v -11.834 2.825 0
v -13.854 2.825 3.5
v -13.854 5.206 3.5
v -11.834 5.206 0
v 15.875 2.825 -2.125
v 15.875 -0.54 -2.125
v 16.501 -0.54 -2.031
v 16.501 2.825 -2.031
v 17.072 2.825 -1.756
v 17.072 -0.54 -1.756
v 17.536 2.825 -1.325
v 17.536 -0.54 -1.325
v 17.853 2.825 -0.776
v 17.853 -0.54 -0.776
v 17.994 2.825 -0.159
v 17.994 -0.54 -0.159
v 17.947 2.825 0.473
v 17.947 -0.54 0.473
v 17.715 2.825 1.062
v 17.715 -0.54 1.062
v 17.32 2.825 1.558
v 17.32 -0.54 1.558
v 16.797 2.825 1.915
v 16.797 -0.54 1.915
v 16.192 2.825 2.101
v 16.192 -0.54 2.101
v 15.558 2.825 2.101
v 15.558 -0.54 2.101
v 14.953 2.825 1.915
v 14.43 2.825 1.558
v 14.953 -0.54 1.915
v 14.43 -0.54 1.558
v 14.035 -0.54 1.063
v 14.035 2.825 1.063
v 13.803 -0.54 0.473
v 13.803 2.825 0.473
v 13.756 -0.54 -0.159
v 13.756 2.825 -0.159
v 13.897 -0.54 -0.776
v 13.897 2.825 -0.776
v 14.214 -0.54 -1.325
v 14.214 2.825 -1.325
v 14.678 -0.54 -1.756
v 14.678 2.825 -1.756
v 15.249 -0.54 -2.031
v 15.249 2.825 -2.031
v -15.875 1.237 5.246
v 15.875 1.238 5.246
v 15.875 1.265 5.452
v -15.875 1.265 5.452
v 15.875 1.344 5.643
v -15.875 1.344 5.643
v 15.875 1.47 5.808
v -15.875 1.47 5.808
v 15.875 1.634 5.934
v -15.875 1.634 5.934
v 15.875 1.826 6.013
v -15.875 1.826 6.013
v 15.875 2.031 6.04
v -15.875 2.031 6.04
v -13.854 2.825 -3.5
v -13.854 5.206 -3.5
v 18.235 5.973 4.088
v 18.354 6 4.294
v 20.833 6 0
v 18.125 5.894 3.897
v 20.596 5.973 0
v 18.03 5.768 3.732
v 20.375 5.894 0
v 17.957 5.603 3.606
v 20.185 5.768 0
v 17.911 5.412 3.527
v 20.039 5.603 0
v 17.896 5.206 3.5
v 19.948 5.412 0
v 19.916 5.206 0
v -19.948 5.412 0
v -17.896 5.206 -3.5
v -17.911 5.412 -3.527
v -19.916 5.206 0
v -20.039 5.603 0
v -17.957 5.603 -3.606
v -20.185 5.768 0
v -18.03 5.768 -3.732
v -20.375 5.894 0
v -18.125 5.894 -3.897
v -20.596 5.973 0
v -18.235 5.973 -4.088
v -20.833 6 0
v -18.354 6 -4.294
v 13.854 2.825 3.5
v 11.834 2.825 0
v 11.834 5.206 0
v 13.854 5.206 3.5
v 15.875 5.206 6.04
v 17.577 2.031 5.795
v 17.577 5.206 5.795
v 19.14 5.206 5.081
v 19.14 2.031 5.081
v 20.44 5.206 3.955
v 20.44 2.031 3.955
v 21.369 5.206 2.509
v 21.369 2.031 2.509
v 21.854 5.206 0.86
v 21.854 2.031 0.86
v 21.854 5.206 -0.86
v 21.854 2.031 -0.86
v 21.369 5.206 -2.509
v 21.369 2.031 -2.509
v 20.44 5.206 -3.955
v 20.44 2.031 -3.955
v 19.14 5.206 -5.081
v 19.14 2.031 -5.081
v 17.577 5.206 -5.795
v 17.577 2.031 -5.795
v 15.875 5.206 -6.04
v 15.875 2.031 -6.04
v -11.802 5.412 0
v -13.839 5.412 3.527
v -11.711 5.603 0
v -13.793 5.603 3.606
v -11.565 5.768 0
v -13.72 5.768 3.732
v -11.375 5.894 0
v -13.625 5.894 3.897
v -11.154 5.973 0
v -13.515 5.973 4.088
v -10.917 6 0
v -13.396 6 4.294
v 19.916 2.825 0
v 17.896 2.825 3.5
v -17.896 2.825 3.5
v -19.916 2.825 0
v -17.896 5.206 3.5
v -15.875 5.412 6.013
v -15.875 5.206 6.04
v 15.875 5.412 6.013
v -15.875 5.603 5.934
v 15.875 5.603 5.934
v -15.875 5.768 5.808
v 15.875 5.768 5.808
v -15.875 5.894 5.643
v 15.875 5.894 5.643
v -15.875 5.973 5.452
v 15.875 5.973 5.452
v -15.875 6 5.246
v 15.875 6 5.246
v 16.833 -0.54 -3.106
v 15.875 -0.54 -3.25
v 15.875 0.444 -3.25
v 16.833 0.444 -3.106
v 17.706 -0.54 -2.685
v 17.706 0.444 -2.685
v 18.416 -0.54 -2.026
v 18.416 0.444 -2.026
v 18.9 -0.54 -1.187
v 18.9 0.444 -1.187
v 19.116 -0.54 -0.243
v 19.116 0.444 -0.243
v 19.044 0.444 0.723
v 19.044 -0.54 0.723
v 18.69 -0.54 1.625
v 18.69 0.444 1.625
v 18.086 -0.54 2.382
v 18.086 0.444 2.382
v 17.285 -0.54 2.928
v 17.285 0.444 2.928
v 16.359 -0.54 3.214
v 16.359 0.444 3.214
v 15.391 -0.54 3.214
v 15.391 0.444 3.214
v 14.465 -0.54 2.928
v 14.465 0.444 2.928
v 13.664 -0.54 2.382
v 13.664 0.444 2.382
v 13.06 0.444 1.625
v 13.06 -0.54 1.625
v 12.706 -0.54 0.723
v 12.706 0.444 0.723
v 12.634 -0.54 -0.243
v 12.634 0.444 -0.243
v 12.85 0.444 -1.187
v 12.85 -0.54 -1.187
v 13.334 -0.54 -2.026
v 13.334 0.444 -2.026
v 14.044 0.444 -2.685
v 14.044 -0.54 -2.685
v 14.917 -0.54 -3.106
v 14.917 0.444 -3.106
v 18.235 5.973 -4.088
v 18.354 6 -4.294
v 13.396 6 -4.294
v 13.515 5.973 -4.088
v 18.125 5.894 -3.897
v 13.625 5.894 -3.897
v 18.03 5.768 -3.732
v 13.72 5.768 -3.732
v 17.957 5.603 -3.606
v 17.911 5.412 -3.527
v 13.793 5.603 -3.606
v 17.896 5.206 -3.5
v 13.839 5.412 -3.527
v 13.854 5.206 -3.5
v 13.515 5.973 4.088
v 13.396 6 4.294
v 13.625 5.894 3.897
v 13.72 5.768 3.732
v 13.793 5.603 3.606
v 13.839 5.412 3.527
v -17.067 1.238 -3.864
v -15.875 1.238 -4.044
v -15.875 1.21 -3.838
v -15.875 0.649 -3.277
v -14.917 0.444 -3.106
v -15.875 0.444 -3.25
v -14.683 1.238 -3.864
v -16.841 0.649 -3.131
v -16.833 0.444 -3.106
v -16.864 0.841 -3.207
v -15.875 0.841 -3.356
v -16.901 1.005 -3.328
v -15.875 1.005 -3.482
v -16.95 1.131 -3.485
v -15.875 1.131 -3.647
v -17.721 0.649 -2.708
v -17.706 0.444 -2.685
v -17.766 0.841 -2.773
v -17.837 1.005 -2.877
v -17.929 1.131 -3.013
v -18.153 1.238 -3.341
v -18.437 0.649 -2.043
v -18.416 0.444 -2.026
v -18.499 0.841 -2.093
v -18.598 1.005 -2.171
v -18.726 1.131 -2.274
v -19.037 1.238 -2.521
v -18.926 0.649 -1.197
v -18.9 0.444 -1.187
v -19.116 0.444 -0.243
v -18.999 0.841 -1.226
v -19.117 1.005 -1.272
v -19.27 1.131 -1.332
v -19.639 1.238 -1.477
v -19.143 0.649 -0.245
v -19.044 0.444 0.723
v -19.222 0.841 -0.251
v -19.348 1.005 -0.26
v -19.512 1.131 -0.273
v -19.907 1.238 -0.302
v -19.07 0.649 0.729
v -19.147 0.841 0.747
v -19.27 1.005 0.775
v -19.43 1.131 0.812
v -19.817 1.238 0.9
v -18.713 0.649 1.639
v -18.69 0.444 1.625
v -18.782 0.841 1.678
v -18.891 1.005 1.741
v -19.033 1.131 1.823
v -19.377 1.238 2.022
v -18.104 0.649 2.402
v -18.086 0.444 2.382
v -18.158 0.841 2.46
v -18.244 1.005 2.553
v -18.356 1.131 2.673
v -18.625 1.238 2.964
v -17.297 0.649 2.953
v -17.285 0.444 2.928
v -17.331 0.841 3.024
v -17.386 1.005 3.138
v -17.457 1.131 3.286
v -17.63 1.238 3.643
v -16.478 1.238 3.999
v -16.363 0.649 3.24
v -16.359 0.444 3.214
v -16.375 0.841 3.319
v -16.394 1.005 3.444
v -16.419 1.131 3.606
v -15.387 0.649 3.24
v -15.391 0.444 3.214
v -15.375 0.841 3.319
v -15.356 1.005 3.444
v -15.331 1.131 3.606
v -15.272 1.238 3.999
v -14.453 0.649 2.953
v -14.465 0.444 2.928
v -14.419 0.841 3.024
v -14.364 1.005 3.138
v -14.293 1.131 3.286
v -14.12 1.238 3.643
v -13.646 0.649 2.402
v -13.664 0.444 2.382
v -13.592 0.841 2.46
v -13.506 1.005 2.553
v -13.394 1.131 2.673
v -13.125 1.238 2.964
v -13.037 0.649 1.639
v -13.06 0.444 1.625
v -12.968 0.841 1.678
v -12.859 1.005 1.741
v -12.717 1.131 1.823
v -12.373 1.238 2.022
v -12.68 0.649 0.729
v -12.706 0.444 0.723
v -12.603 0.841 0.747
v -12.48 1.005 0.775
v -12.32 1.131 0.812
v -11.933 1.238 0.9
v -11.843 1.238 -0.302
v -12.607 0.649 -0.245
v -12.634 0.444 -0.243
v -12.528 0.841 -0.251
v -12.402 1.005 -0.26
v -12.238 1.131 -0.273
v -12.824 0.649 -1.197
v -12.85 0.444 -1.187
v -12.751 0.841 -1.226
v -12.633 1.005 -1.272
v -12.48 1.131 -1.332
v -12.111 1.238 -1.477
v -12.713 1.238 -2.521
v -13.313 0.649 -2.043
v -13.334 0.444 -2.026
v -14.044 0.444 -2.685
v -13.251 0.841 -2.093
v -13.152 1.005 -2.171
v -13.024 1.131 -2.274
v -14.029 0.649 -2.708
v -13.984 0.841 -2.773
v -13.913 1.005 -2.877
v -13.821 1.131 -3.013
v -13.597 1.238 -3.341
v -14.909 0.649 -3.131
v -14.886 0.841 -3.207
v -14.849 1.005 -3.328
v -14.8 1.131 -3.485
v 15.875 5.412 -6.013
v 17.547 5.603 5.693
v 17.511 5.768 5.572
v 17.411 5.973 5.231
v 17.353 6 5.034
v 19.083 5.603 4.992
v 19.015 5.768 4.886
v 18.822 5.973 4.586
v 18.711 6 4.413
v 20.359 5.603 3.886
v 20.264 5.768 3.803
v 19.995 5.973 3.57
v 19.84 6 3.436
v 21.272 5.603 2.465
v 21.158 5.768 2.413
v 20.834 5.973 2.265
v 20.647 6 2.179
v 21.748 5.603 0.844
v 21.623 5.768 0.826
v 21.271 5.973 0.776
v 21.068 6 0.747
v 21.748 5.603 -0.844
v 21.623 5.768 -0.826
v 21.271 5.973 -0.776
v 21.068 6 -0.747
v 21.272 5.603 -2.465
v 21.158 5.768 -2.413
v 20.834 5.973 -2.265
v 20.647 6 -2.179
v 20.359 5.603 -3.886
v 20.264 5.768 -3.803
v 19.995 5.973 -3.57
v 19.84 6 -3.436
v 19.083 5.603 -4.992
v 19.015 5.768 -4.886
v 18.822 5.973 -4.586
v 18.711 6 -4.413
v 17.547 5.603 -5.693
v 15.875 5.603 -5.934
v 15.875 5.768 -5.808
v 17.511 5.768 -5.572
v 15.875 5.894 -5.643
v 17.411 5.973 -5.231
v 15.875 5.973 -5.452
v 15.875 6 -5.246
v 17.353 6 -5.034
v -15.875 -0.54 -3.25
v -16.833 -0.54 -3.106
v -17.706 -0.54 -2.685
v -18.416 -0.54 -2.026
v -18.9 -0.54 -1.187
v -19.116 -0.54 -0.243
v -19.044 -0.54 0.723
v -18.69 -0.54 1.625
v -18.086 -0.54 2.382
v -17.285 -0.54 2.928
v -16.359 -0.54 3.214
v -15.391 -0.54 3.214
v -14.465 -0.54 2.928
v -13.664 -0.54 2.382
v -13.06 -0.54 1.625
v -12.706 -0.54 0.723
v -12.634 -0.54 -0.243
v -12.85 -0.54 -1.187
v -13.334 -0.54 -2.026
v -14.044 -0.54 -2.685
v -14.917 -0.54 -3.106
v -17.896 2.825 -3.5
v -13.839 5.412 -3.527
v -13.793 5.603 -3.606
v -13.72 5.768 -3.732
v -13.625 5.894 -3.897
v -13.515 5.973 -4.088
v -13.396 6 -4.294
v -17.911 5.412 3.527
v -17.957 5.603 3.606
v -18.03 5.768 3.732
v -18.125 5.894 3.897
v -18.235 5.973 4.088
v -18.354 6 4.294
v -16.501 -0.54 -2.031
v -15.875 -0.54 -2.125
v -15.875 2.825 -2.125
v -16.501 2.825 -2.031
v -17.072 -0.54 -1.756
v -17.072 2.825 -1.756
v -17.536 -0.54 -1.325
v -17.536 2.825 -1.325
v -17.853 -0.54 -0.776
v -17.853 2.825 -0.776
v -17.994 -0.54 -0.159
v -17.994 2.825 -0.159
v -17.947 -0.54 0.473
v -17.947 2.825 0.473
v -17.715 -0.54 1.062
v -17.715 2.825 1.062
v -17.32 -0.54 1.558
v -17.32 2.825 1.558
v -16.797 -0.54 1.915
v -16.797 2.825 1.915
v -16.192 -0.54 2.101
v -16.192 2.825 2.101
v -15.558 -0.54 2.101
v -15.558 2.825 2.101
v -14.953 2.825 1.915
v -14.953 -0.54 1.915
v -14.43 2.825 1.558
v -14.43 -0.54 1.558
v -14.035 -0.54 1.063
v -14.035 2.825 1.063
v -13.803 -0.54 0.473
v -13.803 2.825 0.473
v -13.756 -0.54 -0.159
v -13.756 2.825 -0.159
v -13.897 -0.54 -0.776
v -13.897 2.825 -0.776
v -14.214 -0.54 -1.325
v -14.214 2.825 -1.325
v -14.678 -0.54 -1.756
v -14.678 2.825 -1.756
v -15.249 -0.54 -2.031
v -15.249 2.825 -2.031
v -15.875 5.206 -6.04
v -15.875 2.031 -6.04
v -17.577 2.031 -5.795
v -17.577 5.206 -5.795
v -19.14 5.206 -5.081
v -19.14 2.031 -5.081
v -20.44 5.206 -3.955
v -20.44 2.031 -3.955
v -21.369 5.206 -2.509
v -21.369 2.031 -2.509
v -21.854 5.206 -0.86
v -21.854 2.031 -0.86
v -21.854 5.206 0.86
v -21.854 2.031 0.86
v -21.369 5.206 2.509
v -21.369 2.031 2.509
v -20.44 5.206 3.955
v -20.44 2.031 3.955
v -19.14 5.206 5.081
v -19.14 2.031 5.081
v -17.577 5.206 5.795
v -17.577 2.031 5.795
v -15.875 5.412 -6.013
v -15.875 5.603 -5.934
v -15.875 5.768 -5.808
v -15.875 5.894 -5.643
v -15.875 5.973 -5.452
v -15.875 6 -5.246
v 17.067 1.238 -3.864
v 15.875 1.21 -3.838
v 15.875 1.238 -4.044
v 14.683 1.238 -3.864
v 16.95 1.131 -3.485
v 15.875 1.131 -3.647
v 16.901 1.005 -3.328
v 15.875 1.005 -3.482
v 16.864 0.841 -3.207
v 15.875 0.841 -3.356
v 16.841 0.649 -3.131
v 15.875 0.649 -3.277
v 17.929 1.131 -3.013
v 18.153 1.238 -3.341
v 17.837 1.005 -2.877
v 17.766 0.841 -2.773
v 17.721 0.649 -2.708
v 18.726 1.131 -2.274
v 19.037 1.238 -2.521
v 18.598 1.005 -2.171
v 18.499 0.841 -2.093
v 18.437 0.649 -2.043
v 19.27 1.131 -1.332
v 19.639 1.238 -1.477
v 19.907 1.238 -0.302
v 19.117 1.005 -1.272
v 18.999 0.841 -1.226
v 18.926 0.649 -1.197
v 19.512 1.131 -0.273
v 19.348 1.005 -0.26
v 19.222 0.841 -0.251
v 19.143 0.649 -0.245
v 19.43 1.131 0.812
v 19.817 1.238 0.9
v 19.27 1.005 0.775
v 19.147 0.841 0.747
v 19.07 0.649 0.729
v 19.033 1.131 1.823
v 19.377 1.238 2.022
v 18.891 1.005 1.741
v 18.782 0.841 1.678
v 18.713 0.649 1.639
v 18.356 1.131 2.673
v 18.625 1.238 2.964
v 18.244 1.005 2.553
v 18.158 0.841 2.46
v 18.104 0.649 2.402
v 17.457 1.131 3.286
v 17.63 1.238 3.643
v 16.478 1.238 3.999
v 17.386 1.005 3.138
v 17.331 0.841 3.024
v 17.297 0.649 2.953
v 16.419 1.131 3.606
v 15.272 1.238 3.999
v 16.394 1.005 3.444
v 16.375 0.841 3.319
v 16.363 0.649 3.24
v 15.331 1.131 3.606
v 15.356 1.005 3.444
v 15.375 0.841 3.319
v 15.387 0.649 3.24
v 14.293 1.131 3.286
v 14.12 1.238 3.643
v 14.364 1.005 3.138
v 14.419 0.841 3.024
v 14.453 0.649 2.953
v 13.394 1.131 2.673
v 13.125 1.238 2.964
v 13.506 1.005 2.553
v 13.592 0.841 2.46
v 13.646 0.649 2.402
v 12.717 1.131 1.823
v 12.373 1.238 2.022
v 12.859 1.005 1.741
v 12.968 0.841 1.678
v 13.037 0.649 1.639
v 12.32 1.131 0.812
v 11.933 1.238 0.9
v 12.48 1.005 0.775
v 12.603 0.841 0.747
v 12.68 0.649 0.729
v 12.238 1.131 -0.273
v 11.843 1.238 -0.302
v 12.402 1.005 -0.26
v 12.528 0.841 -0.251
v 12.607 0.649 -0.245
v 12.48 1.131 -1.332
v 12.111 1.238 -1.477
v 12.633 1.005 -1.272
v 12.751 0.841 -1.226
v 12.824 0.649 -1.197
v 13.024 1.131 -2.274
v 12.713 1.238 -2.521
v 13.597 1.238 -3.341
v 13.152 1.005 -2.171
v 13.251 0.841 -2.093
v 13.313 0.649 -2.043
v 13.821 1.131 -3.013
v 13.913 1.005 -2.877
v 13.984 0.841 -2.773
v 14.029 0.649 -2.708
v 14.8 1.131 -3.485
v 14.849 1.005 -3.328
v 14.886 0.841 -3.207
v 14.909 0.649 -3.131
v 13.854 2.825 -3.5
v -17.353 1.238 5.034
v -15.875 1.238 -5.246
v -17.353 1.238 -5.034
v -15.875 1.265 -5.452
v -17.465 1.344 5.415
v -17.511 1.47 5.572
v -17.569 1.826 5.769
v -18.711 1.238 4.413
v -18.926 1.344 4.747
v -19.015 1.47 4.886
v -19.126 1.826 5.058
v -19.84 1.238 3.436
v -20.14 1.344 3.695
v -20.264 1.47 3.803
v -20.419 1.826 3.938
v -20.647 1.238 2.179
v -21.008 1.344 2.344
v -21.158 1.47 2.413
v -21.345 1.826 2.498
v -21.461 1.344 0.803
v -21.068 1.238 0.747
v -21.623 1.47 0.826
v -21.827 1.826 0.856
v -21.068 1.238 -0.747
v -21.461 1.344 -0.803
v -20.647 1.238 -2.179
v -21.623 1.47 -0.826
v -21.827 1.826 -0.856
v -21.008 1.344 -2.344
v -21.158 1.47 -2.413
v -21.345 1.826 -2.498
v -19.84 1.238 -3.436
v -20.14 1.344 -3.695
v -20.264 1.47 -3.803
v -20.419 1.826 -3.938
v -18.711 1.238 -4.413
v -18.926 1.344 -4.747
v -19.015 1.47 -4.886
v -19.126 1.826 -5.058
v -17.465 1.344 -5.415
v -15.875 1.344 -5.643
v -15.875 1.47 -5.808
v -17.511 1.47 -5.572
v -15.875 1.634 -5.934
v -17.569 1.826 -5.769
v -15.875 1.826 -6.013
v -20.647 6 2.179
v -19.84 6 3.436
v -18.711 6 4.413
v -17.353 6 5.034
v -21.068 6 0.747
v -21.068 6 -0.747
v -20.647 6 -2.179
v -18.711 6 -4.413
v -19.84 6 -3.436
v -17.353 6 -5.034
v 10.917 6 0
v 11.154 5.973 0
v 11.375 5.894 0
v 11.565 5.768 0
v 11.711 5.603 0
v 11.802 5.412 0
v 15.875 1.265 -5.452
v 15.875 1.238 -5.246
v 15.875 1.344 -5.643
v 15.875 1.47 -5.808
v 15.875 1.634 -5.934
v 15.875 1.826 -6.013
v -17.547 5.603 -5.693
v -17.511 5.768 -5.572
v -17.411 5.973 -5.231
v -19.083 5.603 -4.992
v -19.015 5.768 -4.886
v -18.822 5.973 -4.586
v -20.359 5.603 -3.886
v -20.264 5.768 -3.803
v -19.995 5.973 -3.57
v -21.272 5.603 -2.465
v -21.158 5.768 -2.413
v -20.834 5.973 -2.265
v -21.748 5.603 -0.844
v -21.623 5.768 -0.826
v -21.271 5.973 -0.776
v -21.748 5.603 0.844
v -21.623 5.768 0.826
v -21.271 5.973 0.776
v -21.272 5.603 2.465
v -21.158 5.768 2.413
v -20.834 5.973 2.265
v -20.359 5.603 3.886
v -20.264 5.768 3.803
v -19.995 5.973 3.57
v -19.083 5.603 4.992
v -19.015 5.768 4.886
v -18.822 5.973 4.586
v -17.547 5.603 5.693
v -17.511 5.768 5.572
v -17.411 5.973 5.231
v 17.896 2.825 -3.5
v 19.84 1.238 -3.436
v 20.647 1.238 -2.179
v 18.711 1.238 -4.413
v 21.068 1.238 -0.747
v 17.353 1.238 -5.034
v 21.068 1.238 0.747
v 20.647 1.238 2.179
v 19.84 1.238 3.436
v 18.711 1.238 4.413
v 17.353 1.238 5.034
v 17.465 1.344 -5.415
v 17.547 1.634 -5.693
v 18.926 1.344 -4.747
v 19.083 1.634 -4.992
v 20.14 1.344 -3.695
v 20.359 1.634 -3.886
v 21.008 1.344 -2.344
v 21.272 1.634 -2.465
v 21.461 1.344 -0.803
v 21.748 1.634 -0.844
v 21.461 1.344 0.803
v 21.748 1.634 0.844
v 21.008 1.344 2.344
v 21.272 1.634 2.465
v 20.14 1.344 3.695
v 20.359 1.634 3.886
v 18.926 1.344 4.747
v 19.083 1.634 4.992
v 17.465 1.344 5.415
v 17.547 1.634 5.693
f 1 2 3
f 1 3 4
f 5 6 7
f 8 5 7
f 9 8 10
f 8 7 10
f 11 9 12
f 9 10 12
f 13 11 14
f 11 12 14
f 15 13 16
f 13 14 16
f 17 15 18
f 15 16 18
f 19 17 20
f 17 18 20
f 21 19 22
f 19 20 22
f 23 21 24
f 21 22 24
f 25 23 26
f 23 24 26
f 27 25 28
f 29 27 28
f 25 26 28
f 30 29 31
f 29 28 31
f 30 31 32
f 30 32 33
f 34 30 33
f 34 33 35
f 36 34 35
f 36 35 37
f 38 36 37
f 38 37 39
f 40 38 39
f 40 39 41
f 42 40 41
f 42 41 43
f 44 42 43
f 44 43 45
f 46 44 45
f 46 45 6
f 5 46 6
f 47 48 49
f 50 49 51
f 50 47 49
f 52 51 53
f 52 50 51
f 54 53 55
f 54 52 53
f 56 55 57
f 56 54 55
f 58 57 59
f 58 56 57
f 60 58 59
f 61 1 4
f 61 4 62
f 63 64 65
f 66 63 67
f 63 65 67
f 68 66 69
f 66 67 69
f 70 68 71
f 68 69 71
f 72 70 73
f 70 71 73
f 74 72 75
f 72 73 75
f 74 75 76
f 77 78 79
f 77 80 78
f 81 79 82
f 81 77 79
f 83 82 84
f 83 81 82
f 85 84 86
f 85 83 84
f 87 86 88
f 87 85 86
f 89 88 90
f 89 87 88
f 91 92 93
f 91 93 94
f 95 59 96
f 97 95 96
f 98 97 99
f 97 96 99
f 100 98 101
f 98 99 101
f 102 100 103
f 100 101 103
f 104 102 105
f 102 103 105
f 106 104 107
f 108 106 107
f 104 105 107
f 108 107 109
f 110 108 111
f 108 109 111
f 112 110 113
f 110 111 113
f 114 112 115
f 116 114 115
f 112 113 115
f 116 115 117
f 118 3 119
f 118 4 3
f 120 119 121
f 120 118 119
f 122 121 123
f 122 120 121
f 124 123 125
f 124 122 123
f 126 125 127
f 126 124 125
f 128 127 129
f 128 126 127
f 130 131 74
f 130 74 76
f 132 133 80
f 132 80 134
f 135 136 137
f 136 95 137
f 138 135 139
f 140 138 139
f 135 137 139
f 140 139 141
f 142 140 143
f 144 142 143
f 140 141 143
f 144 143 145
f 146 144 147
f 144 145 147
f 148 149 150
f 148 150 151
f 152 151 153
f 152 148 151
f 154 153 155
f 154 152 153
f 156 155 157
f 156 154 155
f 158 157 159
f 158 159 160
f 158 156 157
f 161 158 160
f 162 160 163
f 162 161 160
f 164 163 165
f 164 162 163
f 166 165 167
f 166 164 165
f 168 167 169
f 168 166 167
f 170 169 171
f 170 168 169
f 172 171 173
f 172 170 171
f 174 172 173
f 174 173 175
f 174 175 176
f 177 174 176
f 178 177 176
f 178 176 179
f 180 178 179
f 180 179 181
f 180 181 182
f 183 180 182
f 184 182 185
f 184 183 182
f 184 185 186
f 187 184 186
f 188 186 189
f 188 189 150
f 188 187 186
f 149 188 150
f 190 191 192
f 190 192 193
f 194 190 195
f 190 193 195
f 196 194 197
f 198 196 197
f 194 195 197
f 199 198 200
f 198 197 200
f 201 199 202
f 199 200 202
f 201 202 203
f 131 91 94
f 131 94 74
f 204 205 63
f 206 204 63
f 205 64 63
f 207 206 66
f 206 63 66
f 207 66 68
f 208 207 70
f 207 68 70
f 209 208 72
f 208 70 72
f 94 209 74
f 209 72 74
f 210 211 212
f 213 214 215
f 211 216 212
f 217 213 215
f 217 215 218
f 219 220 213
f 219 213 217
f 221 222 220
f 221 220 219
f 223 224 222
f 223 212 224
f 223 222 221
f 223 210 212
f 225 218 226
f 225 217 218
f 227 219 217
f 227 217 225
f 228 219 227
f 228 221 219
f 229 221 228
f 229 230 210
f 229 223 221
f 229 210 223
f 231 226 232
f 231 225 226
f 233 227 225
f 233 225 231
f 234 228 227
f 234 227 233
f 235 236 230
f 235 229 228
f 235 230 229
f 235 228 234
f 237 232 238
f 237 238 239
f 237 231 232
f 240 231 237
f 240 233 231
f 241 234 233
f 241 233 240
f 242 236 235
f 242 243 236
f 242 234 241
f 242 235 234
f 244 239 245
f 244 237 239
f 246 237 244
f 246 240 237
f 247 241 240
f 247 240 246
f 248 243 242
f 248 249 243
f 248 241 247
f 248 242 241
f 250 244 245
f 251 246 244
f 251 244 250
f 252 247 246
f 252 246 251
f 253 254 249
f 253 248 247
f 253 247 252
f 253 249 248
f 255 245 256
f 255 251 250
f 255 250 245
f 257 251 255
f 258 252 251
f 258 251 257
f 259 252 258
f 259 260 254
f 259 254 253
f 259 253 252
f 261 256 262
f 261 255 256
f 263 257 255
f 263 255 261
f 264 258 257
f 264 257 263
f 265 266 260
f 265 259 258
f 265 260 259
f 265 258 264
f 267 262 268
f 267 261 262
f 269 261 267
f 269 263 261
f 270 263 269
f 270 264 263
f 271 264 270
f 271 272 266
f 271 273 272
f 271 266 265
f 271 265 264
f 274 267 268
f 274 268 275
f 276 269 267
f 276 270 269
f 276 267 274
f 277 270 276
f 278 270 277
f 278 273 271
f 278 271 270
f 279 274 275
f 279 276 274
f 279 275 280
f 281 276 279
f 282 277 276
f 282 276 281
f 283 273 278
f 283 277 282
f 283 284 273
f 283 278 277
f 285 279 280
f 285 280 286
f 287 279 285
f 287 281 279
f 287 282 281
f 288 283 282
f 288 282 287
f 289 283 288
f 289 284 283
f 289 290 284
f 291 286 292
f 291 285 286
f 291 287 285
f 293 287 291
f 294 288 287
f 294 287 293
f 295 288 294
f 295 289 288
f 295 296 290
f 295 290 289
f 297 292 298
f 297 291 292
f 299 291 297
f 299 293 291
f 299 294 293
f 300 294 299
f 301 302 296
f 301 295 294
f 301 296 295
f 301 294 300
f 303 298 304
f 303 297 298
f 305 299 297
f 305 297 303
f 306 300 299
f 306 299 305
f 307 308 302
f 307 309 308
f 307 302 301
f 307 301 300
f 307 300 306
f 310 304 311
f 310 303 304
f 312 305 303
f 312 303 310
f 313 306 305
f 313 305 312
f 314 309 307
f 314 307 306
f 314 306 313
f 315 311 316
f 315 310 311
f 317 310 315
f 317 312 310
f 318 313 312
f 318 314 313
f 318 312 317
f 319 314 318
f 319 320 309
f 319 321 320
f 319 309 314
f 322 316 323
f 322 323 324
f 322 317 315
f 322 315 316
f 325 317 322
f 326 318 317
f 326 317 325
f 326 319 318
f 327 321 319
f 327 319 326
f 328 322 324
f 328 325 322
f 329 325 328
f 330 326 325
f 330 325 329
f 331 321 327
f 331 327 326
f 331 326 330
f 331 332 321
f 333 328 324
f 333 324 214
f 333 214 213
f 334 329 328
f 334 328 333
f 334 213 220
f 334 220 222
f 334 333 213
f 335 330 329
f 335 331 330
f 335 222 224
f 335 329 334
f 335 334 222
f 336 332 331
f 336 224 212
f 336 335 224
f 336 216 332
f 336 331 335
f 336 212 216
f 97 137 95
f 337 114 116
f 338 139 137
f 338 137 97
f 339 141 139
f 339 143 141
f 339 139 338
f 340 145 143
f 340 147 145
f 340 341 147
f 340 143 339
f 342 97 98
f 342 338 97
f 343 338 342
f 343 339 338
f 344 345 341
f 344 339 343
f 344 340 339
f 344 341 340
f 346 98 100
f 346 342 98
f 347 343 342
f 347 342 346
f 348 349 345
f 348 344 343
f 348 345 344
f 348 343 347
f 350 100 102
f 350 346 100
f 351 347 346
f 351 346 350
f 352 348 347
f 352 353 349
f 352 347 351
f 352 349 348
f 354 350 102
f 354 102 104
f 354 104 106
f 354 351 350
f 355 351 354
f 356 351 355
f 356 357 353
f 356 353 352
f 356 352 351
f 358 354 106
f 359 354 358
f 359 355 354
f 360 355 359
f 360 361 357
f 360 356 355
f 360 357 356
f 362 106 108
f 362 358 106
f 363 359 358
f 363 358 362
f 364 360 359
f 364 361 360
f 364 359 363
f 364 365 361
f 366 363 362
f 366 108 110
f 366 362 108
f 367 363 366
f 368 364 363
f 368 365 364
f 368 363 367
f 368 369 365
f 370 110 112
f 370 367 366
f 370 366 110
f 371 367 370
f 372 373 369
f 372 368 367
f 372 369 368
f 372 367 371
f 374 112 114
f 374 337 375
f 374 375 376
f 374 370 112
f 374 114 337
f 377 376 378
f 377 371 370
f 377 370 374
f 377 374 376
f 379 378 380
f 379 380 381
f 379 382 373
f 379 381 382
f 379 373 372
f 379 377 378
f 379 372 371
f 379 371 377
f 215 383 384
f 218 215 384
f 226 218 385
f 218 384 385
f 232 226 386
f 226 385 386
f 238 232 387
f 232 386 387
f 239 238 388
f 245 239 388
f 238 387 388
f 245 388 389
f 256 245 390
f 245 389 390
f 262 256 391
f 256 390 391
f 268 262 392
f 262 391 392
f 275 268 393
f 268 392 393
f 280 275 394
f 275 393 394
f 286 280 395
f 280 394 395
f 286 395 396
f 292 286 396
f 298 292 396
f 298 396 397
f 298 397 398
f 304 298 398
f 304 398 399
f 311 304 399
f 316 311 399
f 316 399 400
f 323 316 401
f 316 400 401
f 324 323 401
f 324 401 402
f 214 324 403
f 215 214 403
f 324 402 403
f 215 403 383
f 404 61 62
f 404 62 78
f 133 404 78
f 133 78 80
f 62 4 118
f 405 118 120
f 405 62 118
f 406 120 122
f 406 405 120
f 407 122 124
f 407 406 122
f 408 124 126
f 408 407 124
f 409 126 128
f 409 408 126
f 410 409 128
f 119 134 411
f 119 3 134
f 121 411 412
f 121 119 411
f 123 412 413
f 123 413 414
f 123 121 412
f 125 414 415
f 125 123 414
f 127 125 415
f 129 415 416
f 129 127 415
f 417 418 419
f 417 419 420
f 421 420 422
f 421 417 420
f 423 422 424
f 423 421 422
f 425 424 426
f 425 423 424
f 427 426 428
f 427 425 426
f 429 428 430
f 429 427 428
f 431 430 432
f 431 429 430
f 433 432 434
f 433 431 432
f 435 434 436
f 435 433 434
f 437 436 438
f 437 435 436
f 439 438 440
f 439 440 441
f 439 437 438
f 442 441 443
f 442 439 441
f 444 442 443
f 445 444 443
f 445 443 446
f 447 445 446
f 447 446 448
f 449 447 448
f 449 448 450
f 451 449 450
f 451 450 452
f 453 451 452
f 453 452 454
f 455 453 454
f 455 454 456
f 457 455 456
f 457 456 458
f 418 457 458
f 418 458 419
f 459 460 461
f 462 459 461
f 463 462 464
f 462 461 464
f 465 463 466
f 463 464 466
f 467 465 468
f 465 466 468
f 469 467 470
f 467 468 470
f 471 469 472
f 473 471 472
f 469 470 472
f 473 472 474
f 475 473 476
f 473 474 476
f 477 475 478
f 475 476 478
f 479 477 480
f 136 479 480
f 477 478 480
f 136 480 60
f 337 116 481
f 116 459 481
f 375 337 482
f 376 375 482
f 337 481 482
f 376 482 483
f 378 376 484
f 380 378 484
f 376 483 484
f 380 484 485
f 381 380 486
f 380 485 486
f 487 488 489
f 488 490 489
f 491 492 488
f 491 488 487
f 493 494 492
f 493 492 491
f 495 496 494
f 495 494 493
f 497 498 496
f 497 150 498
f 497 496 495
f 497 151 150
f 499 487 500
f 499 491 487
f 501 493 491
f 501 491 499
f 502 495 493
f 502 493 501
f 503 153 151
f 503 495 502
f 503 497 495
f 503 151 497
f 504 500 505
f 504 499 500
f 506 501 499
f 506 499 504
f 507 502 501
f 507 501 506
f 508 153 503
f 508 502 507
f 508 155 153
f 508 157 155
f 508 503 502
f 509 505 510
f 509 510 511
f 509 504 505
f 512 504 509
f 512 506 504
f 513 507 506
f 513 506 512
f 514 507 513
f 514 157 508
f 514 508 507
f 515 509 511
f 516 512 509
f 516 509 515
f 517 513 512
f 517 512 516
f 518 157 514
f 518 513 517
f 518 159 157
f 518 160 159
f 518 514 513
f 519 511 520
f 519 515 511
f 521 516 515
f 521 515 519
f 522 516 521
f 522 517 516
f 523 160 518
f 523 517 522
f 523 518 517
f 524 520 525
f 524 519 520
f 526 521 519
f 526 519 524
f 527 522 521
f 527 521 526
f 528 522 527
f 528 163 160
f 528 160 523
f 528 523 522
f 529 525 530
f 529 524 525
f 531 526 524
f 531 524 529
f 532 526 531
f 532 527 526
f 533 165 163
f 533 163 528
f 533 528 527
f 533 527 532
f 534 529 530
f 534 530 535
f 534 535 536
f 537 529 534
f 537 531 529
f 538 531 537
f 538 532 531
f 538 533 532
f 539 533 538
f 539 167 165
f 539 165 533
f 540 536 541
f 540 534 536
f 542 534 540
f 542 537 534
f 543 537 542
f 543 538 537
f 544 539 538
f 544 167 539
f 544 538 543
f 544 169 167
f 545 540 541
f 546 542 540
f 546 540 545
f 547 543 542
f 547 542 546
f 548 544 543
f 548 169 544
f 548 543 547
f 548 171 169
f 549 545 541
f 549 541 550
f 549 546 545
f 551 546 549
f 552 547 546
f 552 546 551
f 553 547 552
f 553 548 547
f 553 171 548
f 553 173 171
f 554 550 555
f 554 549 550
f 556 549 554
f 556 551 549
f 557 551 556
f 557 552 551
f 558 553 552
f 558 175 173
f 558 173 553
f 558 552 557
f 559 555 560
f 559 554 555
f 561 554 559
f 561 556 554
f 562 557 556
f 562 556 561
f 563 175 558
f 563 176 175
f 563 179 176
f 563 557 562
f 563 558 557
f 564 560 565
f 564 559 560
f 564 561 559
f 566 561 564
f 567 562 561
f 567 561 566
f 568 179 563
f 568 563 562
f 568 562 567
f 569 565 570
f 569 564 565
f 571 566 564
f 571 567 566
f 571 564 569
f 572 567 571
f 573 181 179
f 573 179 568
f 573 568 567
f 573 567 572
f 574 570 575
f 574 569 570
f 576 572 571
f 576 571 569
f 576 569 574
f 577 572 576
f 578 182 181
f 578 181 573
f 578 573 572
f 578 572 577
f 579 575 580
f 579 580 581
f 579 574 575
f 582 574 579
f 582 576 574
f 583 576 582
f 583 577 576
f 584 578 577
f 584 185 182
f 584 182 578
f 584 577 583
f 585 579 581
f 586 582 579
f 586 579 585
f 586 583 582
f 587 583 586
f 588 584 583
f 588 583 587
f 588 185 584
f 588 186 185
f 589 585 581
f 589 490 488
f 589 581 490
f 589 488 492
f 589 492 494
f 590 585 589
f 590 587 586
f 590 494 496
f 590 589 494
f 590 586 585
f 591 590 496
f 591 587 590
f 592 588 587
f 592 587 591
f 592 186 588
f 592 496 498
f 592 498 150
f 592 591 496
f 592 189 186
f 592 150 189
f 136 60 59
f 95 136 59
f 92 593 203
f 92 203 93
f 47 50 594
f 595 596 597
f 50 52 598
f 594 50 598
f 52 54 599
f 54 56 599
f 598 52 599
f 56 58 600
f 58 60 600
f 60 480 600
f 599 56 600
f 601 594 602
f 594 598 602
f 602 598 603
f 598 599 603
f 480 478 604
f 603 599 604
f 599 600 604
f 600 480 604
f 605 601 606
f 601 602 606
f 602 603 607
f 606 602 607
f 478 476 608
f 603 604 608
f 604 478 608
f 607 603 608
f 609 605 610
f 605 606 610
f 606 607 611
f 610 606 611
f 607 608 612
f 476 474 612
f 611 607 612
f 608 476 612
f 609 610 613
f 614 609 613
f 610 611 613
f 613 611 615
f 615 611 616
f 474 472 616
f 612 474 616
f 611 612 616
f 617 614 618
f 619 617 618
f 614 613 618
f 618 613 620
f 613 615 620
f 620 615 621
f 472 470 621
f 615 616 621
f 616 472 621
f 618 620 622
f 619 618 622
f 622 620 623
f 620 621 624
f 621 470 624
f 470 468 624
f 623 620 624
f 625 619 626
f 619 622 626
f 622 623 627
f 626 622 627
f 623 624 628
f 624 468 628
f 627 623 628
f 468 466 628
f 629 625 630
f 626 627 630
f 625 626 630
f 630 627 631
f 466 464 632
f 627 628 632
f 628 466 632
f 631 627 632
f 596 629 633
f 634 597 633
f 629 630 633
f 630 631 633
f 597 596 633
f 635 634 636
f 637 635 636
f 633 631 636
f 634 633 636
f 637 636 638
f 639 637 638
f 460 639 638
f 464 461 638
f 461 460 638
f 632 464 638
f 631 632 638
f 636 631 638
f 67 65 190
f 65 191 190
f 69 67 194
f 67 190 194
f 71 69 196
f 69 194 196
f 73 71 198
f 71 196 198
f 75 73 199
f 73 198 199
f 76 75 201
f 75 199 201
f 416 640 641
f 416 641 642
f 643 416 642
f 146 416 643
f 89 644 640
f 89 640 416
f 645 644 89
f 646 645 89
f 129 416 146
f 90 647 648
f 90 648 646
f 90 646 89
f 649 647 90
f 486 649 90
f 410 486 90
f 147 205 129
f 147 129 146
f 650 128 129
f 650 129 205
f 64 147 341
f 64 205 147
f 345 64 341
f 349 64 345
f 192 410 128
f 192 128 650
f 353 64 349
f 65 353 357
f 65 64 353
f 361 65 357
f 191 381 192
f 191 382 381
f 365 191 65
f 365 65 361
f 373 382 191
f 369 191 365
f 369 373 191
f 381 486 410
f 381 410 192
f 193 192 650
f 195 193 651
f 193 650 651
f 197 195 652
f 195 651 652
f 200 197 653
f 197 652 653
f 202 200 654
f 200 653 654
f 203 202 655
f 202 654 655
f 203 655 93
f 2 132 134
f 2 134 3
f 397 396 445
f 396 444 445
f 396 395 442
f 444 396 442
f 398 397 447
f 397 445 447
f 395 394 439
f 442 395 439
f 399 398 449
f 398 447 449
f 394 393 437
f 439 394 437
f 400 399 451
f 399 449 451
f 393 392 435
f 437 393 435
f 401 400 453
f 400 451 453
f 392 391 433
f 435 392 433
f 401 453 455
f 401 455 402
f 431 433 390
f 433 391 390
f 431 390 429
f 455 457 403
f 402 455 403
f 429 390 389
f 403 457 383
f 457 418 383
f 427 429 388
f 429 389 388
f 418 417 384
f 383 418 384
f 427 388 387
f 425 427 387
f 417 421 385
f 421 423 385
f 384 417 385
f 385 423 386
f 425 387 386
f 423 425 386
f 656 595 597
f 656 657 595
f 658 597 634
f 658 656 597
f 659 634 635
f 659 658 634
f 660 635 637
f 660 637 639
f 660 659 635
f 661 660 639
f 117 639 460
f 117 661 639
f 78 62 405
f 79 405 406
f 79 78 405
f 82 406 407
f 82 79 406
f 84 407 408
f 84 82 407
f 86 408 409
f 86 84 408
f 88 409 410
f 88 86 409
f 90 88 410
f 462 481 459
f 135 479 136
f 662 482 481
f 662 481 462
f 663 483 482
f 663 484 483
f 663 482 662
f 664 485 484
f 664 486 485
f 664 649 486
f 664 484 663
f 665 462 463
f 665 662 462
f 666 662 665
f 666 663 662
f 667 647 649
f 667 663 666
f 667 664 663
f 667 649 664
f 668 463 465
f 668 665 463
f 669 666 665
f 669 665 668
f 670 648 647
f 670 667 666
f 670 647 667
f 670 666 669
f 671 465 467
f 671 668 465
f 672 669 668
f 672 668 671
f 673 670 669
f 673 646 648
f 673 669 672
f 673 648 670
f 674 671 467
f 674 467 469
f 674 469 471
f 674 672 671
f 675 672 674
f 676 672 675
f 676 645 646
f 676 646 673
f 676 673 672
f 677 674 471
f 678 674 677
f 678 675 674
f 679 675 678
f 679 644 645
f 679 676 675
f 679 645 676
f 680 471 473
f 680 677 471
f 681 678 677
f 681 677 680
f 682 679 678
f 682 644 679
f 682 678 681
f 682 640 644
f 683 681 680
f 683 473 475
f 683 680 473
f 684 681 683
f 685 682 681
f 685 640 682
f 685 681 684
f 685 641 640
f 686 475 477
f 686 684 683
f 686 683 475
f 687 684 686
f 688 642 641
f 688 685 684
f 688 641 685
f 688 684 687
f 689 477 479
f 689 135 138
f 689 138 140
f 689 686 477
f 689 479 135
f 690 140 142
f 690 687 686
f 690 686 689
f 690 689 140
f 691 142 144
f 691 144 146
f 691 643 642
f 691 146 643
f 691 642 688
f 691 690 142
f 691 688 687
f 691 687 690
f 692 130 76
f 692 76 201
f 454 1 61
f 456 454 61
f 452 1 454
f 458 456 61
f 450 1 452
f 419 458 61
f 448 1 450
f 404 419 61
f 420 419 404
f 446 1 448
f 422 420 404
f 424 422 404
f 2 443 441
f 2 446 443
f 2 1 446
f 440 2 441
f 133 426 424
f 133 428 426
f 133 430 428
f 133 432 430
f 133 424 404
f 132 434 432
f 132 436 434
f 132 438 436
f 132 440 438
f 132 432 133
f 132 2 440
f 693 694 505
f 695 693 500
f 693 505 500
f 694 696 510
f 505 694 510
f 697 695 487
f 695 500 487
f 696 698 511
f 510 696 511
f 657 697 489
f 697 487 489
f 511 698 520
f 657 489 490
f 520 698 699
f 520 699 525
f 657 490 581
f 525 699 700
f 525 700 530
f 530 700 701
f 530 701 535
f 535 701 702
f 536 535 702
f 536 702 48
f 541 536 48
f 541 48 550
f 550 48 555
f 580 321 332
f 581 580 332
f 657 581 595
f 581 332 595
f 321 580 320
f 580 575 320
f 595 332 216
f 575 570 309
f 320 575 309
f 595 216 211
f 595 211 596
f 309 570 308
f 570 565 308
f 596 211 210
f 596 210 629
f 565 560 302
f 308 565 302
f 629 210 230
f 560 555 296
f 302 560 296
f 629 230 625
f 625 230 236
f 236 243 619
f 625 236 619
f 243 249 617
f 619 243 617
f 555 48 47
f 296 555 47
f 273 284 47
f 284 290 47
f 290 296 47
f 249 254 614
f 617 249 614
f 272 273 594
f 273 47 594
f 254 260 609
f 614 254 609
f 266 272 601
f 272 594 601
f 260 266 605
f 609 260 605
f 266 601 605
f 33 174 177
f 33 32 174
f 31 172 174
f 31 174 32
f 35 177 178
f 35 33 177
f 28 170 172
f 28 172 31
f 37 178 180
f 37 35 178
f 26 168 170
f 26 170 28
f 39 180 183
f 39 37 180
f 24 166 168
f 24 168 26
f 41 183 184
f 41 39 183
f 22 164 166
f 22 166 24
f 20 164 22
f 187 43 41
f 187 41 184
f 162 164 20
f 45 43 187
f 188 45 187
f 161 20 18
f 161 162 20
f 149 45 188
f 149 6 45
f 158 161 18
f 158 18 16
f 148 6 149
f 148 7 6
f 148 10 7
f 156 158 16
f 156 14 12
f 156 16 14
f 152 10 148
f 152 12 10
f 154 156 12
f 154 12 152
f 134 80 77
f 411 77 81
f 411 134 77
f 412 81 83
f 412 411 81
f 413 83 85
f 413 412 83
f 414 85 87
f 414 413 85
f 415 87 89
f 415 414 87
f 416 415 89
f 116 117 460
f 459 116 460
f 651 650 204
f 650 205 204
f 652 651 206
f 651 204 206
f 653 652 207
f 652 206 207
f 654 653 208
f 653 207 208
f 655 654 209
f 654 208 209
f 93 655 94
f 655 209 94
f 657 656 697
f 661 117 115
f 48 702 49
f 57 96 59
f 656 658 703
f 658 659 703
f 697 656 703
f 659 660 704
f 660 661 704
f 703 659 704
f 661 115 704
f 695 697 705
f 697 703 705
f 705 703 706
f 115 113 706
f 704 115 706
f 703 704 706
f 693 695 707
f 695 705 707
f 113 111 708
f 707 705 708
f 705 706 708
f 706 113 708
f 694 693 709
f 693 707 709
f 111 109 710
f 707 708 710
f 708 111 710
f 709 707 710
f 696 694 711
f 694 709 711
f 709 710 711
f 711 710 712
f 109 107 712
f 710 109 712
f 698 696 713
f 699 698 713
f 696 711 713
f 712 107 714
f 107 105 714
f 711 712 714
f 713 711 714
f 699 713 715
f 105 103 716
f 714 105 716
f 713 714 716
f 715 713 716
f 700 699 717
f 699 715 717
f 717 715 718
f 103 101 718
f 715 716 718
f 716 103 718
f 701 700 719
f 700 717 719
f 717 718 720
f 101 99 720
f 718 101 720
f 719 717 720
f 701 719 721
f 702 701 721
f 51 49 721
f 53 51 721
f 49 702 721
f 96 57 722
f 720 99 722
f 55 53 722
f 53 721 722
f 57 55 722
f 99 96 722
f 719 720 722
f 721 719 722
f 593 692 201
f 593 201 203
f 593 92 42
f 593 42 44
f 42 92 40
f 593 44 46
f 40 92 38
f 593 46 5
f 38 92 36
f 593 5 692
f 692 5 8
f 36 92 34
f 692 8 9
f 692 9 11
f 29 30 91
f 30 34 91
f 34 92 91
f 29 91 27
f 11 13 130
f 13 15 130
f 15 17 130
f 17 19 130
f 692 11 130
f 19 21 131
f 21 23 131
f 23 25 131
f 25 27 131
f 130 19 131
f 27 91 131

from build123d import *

# Parameters (mm, degrees)
BOSS_EXTRUDE1_DEPTH = 4.5
BOSS_EXTRUDE2_DEPTH = 1.5
CUT_EXTRUDE1_DEPTH  = 1.2375
SKETCH6_R           = 2.125
BOSS_EXTRUDE3_DEPTH = 1.5875
BOSS_EXTRUDE4_START = 1.778
SKETCH7_R           = 3.25
SKETCH7_R_2         = 2.125
BOSS_EXTRUDE4_DEPTH = 1.778
FILLET2_R           = 0.79375
FILLET3_R           = 0.79375


with BuildPart() as part:
    # Sketch1 → Boss-Extrude1 (new body)
    with BuildSketch(Plane(origin=(0, 0, 0), x_dir=(1, 0, 0), z_dir=(0, 1, 0))):
        with BuildLine():
            Line((-15.875, 6.04), (15.875, 6.04))
            ThreePointArc((15.875, 6.04), (21.915, 0), (15.875, -6.04))
            Line((15.875, -6.04), (-15.875, -6.04))
            ThreePointArc((-15.875, -6.04), (-21.915, 0), (-15.875, 6.04))
        make_face()
        Polygon((-13.854274058, 3.5), (-17.895725942, 3.5), (-19.916451884, 0), (-17.895725942, -3.5), (-13.854274058, -3.5), (-11.833548116, 0), align=None, mode=Mode.SUBTRACT)
        Polygon((17.895725942, 3.5), (13.854274058, 3.5), (11.833548116, 0), (13.854274058, -3.5), (17.895725942, -3.5), (19.916451884, 0), align=None, mode=Mode.SUBTRACT)
    extrude(amount=BOSS_EXTRUDE1_DEPTH)

    # Sketch2 → Boss-Extrude2 (add)
    with BuildSketch(Plane(origin=(0, 4.5, 0), x_dir=(1, 0, 0), z_dir=(0, 1, 0))):
        with BuildLine():
            Line((15.875, 6.04), (-15.875, 6.04))
            ThreePointArc((-15.875, 6.04), (-21.915, 0), (-15.875, -6.04))
            Line((-15.875, -6.04), (15.875, -6.04))
            ThreePointArc((15.875, -6.04), (21.915, 0), (15.875, 6.04))
        make_face()
        Polygon((19.916451884, 0), (17.895725942, 3.5), (13.854274058, 3.5), (11.833548116, 0), (13.854274058, -3.5), (17.895725942, -3.5), align=None, mode=Mode.SUBTRACT)
        Polygon((-17.895725942, 3.5), (-19.916451884, 0), (-17.895725942, -3.5), (-13.854274058, -3.5), (-11.833548116, 0), (-13.854274058, 3.5), align=None, mode=Mode.SUBTRACT)
    extrude(amount=BOSS_EXTRUDE2_DEPTH)

    # Sketch3 → Cut-Extrude1 (cut)
    with BuildSketch(Plane.XZ):
        with BuildLine():
            Line((15.875, 6.04), (-15.875, 6.04))
            ThreePointArc((-15.875, 6.04), (-21.915, 0), (-15.875, -6.04))
            Line((-15.875, -6.04), (15.875, -6.04))
            ThreePointArc((15.875, -6.04), (21.915, 0), (15.875, 6.04))
        make_face()
    extrude(amount=-CUT_EXTRUDE1_DEPTH, mode=Mode.SUBTRACT)

    # Sketch6 → Boss-Extrude3 (add)
    with BuildSketch(Plane.XZ.offset(-1.2375)):
        Polygon((13.854274058, 3.5), (11.833548116, 0), (13.854274058, -3.5), (17.895725942, -3.5), (19.916451884, 0), (17.895725942, 3.5), align=None)
        with Locations(Location((15.875, 0, 0), (0, 0, 270))):
            Circle(SKETCH6_R, mode=Mode.SUBTRACT)
    boss_extrude3 = extrude(amount=-BOSS_EXTRUDE3_DEPTH)

    # Sketch7 → Boss-Extrude4 (add)
    with BuildSketch(Plane.XZ.offset(-1.2375).offset(BOSS_EXTRUDE4_START)):
        with Locations(Location((15.875, 0, 0), (0, 0, 270))):
            Circle(SKETCH7_R)
        with Locations(Location((15.875, 0, 0), (0, 0, 270))):
            Circle(SKETCH7_R_2, mode=Mode.SUBTRACT)
    boss_extrude4 = extrude(amount=-BOSS_EXTRUDE4_DEPTH)

    # Mirror1: Boss-Extrude3, Boss-Extrude4 across plane
    add(boss_extrude3.mirror(Plane(origin=(0, 0, 0), x_dir=(0, 0, 1), z_dir=(1, 0, 0))))
    add(boss_extrude4.mirror(Plane(origin=(0, 0, 0), x_dir=(0, 0, 1), z_dir=(1, 0, 0))))

    # Fillet2
    fillet2_edges = [part.edges().sort_by_distance(p)[0] for p in [
        (21.915, 1.2375, 0),
        (0, 1.2375, -6.04),
        (-21.915, 1.2375, 0),
        (0, 1.2375, 6.04),
        (15.875, 1.2375, 3.25),
        (-15.875, 1.2375, 3.25),
    ]]
    fillet(fillet2_edges, radius=FILLET2_R)

    # Fillet3
    fillet3_edges = [part.edges().sort_by_distance(p)[0] for p in [
        (21.915, 6, 0),
        (0, 6, -6.04),
        (-21.915, 6, 0),
        (0, 6, 6.04),
        (18.906088913, 6, 1.75),
        (15.875, 6, 3.5),
        (12.843911087, 6, 1.75),
        (12.843911087, 6, -1.75),
        (15.875, 6, -3.5),
        (18.906088913, 6, -1.75),
        (-15.875, 6, -3.5),
        (-12.843911087, 6, -1.75),
        (-12.843911087, 6, 1.75),
        (-15.875, 6, 3.5),
        (-18.906088913, 6, 1.75),
        (-18.906088913, 6, -1.75),
    ]]
    fillet(fillet3_edges, radius=FILLET3_R)


solid = part.part
